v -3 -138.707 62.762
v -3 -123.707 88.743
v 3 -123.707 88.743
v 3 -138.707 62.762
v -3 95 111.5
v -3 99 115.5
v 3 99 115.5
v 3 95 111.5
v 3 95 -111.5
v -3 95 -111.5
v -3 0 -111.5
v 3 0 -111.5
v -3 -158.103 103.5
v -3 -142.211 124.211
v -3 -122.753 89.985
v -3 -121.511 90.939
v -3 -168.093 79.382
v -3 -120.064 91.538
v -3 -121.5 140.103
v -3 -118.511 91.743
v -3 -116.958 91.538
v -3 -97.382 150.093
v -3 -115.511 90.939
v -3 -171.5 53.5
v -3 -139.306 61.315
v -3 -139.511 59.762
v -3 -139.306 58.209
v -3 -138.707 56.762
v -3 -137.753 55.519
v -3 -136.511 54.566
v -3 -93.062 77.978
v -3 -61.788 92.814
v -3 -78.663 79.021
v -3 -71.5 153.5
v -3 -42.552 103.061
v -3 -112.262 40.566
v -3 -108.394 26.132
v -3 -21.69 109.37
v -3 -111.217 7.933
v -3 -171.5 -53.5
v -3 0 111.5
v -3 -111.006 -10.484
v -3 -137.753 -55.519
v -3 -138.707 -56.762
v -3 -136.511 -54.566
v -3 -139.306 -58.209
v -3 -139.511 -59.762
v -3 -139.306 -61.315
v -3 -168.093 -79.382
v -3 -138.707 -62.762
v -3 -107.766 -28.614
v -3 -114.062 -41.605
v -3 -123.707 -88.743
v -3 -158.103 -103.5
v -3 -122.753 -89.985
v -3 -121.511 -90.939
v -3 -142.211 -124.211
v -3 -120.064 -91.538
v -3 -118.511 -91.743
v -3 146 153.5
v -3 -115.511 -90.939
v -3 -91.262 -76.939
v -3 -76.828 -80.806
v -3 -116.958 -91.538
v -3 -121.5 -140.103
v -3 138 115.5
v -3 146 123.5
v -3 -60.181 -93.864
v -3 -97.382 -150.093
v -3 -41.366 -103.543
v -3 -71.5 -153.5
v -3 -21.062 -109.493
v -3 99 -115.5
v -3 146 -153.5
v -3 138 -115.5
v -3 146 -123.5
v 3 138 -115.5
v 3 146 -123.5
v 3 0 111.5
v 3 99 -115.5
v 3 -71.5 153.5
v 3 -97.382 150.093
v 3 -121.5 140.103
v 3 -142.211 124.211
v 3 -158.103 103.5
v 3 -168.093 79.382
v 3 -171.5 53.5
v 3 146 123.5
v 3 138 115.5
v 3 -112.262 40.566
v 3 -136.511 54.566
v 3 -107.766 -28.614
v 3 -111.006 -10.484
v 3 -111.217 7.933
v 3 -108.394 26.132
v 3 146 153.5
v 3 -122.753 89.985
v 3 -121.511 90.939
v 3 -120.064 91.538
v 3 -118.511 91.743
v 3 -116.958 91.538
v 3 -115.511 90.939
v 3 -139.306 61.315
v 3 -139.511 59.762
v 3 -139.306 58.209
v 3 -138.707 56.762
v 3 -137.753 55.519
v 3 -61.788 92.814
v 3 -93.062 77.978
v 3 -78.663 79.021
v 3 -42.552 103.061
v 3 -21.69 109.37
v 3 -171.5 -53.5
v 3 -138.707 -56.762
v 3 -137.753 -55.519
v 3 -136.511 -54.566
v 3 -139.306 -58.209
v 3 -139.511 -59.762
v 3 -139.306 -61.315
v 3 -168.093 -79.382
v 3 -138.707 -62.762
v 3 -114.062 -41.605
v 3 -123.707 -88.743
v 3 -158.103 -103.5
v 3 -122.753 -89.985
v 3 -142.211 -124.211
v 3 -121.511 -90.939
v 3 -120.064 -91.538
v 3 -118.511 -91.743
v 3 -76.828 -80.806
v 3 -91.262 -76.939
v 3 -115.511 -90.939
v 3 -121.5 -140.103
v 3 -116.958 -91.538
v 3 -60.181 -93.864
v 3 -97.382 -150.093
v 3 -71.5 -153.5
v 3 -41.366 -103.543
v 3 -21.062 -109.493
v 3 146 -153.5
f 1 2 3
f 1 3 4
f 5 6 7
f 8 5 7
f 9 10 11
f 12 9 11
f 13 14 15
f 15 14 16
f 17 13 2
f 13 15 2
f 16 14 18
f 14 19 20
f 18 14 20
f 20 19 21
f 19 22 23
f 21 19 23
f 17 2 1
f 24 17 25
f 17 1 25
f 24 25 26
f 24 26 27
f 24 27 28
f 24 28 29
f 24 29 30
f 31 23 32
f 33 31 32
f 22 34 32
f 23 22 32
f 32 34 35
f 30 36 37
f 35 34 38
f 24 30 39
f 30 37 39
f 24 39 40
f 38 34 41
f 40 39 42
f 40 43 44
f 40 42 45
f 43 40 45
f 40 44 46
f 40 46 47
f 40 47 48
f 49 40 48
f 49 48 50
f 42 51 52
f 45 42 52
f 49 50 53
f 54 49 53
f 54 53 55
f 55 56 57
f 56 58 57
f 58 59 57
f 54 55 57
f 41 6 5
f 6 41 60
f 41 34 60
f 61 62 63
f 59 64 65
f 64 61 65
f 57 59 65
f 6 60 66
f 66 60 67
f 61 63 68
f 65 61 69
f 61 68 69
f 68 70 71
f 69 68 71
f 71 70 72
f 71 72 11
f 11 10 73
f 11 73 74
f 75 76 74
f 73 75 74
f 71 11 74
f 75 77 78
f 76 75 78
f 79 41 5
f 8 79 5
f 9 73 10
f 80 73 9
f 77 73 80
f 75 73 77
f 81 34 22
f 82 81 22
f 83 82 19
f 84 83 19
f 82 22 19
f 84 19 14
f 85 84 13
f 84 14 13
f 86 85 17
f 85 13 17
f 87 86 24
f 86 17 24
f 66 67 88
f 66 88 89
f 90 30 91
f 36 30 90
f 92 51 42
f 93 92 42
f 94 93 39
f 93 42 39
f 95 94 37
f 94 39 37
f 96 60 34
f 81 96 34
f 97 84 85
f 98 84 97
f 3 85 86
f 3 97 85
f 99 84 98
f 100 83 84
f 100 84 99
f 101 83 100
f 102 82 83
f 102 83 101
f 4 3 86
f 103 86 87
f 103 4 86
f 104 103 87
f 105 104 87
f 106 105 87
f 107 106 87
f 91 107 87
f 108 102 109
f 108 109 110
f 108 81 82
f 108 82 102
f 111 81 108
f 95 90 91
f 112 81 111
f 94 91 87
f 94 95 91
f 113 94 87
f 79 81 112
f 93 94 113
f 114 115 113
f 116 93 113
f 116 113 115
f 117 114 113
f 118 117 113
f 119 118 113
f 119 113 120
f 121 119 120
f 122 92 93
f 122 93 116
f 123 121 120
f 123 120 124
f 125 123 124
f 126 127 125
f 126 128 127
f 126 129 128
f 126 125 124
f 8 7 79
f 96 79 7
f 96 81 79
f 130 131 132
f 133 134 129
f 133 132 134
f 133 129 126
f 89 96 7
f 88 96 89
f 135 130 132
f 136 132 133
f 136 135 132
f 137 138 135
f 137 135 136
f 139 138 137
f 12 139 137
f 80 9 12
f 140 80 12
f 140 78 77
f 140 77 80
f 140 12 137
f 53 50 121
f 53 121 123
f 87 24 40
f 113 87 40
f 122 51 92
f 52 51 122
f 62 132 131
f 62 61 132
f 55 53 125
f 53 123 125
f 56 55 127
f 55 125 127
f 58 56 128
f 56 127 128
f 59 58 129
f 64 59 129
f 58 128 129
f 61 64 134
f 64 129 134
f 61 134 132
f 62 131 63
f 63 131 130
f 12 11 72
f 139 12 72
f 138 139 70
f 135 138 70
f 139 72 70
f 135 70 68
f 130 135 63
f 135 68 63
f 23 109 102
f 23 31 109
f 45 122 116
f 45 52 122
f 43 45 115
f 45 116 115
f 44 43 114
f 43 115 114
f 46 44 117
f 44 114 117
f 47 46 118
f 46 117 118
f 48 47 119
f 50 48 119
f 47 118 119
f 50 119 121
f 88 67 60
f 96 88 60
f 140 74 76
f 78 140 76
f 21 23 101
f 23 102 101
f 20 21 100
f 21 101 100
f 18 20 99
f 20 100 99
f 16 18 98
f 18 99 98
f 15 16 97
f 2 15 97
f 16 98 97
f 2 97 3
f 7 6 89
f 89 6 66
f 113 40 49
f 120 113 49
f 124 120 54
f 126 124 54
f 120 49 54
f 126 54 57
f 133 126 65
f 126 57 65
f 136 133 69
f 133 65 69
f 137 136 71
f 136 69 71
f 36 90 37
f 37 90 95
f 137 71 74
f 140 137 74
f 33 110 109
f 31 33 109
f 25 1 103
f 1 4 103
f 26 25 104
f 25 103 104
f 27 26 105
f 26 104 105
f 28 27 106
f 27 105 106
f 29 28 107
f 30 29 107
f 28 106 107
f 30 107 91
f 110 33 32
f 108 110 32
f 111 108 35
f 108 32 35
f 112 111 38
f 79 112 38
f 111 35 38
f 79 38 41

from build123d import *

# Parameters (mm, degrees)
SM_START                 = -3
SM_BASE_FLANGE_1_DEPTH   = 6
CUT_EXTRUDE_1_DEPTH      = 231.181450165
CUT_EXTRUDE_1_DEPTH_BACK = 231.181450165
SKETCH_7_W               = 4
SKETCH_7_H               = 47
CHAMFER_2_SIZE           = 8
CHAMFER_2_SIZE_2         = 10.078576046
FILLET_1_R               = 6
CHAMFER_3_SIZE           = 4


with BuildPart() as part:
    # Базовая кромка1: read off the stored shape, not the designer's step
    # Базовая кромка1 outline → Базовая кромка1 (new body)
    with BuildSketch(Plane(origin=(0, 0, 0), x_dir=(0, 0, -1), z_dir=(1, 0, 0)).offset(SM_START)):
        with BuildLine():
            Line((-111.5, 0), (-111.5, 146))
            Line((-111.5, 146), (-153.5, 146))
            Line((-153.5, 146), (-153.5, -71.5))
            ThreePointArc((-153.5, -71.5), (-124.210678119, -142.210678119), (-53.5, -171.5))
            Line((-53.5, -171.5), (53.5, -171.5))
            ThreePointArc((53.5, -171.5), (124.210678119, -142.210678119), (153.5, -71.5))
            Line((153.5, -71.5), (153.5, 146))
            Line((153.5, 146), (111.5, 146))
            Line((111.5, 146), (111.5, 0))
            ThreePointArc((111.5, 0), (0, -111.5), (-111.5, 0))
        make_face()
    extrude(amount=SM_BASE_FLANGE_1_DEPTH)

    # Эскиз7 → Вырез-Вытянуть1 (cut, two sides: drawn at the far end of the back side and taken through both)
    with BuildSketch(Plane(origin=(0, 0, 0), x_dir=(0, 0, -1), z_dir=(1, 0, 0)).offset(-CUT_EXTRUDE_1_DEPTH_BACK)):
        Polygon((72.938816537, -84.333736086), (36.565749578, -105.333736086), (57.565749578, -141.706803045), (93.938816537, -120.706803045), align=None)
        Polygon((-72.938816537, -84.333736086), (-93.938816537, -120.706803045), (-57.565749578, -141.706803045), (-36.565749578, -105.333736086), align=None)
        with Locations((-113.5, 122.5)):
            Rectangle(SKETCH_7_W, SKETCH_7_H)
        with Locations((113.5, 122.5)):
            Rectangle(SKETCH_7_W, SKETCH_7_H)
    extrude(amount=CUT_EXTRUDE_1_DEPTH + CUT_EXTRUDE_1_DEPTH_BACK, mode=Mode.SUBTRACT)

    # Фаска2
    # the kernel refuses this chamfer: 10.078576046, 8 mm, written as the material it takes off along each edge
    with BuildSketch(Plane(origin=(23.573463904, 146, -115.5), x_dir=(0, -1, 0), z_dir=(-1, 0, 0))) as chamfer_2_piece_1:
        Polygon((CHAMFER_2_SIZE, 0), (0, -CHAMFER_2_SIZE), (0, 0), align=None)
    extrude(amount=47.146927807, mode=Mode.SUBTRACT)
    with BuildSketch(Plane(origin=(-23.573463904, 146, 115.5), x_dir=(0, 0, 1), z_dir=(1, 0, 0))) as chamfer_2_piece_2:
        Polygon((CHAMFER_2_SIZE, 0), (0, CHAMFER_2_SIZE), (0, 0), align=None)
    extrude(amount=47.146927807, mode=Mode.SUBTRACT)
    with BuildSketch(Plane(origin=(31.048807118, -84.333736086, -72.938816537), x_dir=(0, -0.8660254037844384, -0.5000000000000006), z_dir=(-1, 0, 0)), Plane(origin=(31.048807118, -105.333736086, 36.565749578), x_dir=(0, -0.8660254037844385, 0.5000000000000004), z_dir=(-1, 0, 0))) as chamfer_2_piece_3:
        with BuildLine():
            Line((CHAMFER_2_SIZE, 0), (-2.56612789, -10.56612789))
            ThreePointArc((-2.56612789, -10.56612789), (-1.195031672, -5.481970258), (0, 0))
            Line((0, 0), (CHAMFER_2_SIZE, 0))
        make_face()
    extrude(amount=62.097614236, mode=Mode.SUBTRACT)
    with BuildSketch(Plane(origin=(-29.036718462, -105.333736086, -36.565749578), x_dir=(0, -0.2924871420802376, 0.9562694556022036), z_dir=(1, 0, 0))) as chamfer_2_piece_4:
        with BuildLine():
            Line((8.31589202, 0), (-CHAMFER_2_SIZE_2 * 0.224833432478, CHAMFER_2_SIZE_2 * 0.974397212447))
            Line((-CHAMFER_2_SIZE_2 * 0.224833432478, CHAMFER_2_SIZE_2 * 0.974397212447), (0, 0))
            ThreePointArc((0, 0), (4.305979523, 0.077455676), (8.31589202, 0))
        make_face()
    extrude(amount=58.073436924, mode=Mode.SUBTRACT)
    with BuildSketch(Plane(origin=(29.036718462, -84.333736086, 72.938816537), x_dir=(0, 0.6819100703745066, 0.7314360231228946), z_dir=(-1, 0, 0))) as chamfer_2_piece_5:
        with BuildLine():
            Line((8.31589202, 0), (-CHAMFER_2_SIZE_2 * 0.224833432478, -CHAMFER_2_SIZE_2 * 0.974397212447))
            Line((-CHAMFER_2_SIZE_2 * 0.224833432478, -CHAMFER_2_SIZE_2 * 0.974397212447), (0, 0))
            ThreePointArc((0, 0), (4.305979523, -0.077455676), (8.31589202, 0))
        make_face()
    extrude(amount=58.073436924, mode=Mode.SUBTRACT)

    # Скругление1
    fillet_1_edges = [part.edges().sort_by_distance(p)[0] for p in [
        (0, -120.706803045, -93.938816537),
        (0, -141.706803045, -57.565749578),
        (0, -141.706803045, 57.565749578),
        (0, -120.706803045, 93.938816537),
    ]]
    fillet(fillet_1_edges, radius=FILLET_1_R)

    # Фаска3
    chamfer_3_edges = [part.edges().sort_by_distance(p)[0] for p in [
        (0, 99, -111.5),
        (0, 99, 111.5),
    ]]
    chamfer(chamfer_3_edges, length=CHAMFER_3_SIZE - 0.0001)  # a hair under: the kernel refuses the full size


solid = part.part
